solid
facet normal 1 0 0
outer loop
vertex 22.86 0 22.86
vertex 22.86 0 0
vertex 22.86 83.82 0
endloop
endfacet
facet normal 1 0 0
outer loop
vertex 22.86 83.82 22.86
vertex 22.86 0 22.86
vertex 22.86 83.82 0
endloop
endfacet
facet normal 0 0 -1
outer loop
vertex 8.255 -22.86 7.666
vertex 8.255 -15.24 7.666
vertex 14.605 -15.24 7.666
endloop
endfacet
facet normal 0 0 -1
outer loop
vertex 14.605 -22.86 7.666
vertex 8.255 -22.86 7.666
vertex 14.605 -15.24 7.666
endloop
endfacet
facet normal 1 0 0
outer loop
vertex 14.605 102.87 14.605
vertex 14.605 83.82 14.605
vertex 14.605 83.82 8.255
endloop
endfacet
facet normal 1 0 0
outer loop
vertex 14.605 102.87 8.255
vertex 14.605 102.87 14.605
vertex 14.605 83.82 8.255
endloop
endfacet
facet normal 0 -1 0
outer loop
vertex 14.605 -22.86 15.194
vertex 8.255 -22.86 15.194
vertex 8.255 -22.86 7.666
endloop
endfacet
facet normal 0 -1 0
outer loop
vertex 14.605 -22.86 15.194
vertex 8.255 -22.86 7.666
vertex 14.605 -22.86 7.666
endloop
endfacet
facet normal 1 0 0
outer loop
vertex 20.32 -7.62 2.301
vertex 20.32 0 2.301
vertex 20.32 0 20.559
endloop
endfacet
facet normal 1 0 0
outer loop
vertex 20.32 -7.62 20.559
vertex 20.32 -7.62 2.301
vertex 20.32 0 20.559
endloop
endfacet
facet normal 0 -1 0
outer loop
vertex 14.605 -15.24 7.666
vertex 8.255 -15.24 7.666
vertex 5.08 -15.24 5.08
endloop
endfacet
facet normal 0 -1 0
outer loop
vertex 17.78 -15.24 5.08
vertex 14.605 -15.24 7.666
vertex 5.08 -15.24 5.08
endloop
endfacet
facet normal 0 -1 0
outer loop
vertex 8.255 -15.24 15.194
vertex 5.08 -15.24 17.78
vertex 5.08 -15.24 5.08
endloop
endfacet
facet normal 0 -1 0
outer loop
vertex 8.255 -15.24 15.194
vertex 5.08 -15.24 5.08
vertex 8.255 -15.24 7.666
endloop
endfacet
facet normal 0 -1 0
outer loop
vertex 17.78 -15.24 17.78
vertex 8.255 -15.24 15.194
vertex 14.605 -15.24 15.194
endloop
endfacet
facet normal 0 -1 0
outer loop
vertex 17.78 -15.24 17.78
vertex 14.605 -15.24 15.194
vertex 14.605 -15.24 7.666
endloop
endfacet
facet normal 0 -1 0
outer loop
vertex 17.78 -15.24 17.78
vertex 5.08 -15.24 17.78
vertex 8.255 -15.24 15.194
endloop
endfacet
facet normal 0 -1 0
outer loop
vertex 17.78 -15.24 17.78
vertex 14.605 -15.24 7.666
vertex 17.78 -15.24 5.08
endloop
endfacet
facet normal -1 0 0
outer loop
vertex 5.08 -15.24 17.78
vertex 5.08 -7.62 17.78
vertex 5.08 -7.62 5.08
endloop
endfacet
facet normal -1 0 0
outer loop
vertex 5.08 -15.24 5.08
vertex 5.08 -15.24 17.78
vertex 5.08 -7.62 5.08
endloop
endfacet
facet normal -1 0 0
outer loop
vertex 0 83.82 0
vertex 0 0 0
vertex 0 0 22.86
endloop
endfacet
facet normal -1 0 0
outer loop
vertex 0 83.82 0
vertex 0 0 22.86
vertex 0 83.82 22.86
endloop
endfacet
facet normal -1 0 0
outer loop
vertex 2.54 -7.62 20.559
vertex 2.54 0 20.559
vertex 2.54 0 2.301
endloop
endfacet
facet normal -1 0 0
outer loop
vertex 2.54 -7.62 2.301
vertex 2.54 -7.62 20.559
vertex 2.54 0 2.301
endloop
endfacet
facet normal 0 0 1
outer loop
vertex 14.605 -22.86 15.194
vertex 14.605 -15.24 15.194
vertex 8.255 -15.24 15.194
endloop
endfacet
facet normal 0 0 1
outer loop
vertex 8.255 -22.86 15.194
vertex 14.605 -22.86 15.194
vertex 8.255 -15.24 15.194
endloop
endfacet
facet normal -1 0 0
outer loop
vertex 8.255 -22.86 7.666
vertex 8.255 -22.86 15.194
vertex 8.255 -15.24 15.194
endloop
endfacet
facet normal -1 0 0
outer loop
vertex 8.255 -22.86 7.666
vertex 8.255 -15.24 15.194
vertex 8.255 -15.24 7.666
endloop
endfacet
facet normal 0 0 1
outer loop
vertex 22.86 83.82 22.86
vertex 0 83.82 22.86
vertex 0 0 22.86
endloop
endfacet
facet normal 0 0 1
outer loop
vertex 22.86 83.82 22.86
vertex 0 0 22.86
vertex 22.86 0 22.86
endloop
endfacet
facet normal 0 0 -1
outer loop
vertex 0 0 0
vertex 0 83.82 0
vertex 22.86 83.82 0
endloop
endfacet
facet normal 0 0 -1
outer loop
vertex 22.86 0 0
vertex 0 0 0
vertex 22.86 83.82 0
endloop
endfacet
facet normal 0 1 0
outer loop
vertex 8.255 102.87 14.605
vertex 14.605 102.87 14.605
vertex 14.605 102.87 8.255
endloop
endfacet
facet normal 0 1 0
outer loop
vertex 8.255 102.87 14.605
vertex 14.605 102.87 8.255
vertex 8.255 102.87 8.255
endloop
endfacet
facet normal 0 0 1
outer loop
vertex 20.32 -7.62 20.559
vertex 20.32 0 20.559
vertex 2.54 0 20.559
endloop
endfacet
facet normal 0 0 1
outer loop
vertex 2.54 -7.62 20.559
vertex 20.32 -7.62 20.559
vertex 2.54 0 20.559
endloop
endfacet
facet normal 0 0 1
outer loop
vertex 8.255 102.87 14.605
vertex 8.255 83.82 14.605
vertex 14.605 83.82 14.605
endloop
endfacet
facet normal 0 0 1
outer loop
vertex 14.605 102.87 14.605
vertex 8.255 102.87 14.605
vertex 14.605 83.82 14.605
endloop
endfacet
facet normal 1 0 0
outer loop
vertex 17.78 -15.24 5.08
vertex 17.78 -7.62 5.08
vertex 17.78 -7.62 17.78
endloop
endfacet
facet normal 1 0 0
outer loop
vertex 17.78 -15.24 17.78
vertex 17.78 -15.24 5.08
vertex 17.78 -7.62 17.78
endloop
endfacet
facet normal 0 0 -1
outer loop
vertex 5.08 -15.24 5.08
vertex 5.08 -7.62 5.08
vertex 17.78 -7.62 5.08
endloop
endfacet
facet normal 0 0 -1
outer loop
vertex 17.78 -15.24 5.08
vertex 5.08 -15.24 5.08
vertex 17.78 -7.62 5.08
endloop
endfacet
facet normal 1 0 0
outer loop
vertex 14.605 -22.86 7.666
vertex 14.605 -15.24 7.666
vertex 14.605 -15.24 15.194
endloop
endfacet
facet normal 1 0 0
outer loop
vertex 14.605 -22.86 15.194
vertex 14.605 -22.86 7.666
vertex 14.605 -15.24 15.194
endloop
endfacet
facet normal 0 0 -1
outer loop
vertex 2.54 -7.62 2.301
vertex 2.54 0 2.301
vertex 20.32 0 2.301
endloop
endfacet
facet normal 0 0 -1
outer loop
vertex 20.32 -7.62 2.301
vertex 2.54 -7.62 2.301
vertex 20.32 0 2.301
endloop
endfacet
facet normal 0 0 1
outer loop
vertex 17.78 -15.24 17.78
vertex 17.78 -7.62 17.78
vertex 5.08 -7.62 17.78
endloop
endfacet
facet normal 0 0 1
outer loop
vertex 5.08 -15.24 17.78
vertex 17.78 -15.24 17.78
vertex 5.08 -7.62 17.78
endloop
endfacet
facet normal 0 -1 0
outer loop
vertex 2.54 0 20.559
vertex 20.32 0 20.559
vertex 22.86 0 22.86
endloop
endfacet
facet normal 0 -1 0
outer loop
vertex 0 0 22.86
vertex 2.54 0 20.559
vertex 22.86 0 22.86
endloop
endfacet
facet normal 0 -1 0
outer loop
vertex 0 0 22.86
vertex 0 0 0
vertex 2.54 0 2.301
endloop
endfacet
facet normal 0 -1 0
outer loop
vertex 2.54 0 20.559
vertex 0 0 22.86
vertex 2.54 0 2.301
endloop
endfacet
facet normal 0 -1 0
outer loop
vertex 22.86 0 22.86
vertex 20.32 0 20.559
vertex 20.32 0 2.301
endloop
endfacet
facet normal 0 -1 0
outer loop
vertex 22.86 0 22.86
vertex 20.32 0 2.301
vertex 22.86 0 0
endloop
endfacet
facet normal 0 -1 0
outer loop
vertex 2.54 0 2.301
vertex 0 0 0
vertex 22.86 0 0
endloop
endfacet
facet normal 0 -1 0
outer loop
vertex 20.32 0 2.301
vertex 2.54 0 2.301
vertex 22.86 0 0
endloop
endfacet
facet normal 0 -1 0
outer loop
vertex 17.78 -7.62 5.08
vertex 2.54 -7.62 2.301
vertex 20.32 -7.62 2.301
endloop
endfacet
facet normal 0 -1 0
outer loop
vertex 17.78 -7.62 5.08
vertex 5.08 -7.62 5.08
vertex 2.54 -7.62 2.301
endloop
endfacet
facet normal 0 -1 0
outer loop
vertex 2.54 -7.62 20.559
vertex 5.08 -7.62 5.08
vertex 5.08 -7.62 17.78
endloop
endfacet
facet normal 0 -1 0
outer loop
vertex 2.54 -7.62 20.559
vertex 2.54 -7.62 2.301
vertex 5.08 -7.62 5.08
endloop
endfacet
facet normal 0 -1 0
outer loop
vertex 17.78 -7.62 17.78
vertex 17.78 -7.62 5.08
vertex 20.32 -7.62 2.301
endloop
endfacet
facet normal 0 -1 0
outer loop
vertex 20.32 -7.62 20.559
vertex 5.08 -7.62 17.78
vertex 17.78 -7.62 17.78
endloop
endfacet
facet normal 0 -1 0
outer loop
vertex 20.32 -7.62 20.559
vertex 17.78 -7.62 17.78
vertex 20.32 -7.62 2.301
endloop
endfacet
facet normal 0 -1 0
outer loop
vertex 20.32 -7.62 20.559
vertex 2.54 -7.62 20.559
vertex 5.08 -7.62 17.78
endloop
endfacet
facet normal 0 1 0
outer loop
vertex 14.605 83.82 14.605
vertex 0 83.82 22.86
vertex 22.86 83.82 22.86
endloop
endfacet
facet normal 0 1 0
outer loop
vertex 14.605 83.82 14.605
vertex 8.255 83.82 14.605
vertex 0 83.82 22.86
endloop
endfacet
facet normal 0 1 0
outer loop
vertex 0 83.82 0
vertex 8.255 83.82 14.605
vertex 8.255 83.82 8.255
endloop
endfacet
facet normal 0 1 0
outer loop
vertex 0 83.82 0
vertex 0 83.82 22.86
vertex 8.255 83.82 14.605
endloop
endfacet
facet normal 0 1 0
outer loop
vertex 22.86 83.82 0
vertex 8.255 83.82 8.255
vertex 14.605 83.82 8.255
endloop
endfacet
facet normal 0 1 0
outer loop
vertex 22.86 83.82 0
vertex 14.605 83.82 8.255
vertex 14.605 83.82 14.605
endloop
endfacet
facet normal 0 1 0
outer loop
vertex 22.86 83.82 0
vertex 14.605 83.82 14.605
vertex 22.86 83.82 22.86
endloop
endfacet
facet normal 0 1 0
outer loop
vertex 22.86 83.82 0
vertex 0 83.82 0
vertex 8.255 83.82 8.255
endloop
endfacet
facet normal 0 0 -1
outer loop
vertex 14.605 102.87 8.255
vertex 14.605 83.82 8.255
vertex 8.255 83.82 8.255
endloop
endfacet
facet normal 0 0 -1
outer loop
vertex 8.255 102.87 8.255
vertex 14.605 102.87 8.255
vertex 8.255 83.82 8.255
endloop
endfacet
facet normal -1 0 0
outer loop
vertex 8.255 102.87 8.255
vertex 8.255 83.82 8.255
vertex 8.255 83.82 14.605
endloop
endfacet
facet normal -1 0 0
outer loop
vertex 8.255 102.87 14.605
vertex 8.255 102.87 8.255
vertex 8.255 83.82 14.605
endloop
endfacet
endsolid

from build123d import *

# Parameters (mm, degrees)
F0_W     = 22.86
F0_H     = 83.82
F1_DEPTH = 22.86
F3_DEPTH = 19.05
F5_DEPTH = 7.62
F6_W     = 6.35
F6_H     = 6.35
F7_DEPTH = 7.62
F9_DEPTH = 7.62


with BuildPart() as f1:
    # F0 (on Top) → F1 (new body)
    with BuildSketch(Plane.XY):
        with Locations((11.43, 41.91)):
            Rectangle(F0_W, F0_H)
    extrude(amount=F1_DEPTH)

    # F2 (on face) → F3 (join)
    with BuildSketch(Plane(origin=(0, 83.82, 0), x_dir=(-1, 0, 0), z_dir=(0, 1, 0))):
        Polygon((-8.255, 8.255), (-8.255, 14.605), (-14.605, 14.605), (-14.605, 11.43), (-14.605, 8.255), align=None)
    extrude(amount=F3_DEPTH)

    # F4 (on face) → F5 (join)
    with BuildSketch(Plane.XZ):
        Polygon((20.32, 20.559318), (2.54, 20.559318), (2.54, 11.43), (2.54, 2.300682), (20.32, 2.300682), align=None)
    extrude(amount=F5_DEPTH)

    # F6 (on face) → F7 (join)
    with BuildSketch(Plane.XZ.offset(7.62)):
        with Locations((8.255, 14.605)):
            Rectangle(F6_W, F6_H)
        Polygon((11.43, 11.43), (5.08, 11.43), (5.08, 5.08), (17.78, 5.08), (17.78, 17.78), (11.43, 17.78), align=None)
    extrude(amount=F7_DEPTH)

    # F8 (on face) → F9 (join)
    with BuildSketch(Plane.XZ.offset(15.24)):
        Polygon((14.605, 15.194485), (8.255, 15.194485), (8.255, 11.43), (8.255, 7.665515), (14.605, 7.665515), align=None)
    extrude(amount=F9_DEPTH)


solid = f1.part
